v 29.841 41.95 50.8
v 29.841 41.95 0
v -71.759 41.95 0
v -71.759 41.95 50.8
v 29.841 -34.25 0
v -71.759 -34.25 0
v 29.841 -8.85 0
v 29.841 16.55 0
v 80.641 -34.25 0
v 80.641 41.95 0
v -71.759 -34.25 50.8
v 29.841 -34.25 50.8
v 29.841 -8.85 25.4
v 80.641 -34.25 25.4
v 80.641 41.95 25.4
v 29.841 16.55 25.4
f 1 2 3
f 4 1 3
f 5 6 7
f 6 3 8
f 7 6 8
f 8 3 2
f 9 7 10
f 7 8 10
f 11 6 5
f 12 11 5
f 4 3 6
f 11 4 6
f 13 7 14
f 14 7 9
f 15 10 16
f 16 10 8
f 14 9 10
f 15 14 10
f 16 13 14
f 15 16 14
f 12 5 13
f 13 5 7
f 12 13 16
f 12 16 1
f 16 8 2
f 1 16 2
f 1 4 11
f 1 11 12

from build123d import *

# Parameters (mm, degrees)
F1_DEPTH = 25.4
F2_DEPTH = 50.8


with BuildPart() as f1:
    # F0 (on Top) → F1 (new body)
    with BuildSketch(Plane.XY):
        Polygon((80.641053, 41.950212), (29.841053, 16.550212), (29.841053, -8.849788), (80.641053, -34.249788), align=None)
    extrude(amount=F1_DEPTH)

    # F0 (on Top) → F2 (join)
    with BuildSketch(Plane.XY):
        Polygon((29.841053, 41.950212), (-71.758947, 41.950212), (-71.758947, -34.249788), (29.841053, -34.249788), (29.841053, -8.849788), (29.841053, 16.550212), align=None)
    extrude(amount=F2_DEPTH)


solid = f1.part
